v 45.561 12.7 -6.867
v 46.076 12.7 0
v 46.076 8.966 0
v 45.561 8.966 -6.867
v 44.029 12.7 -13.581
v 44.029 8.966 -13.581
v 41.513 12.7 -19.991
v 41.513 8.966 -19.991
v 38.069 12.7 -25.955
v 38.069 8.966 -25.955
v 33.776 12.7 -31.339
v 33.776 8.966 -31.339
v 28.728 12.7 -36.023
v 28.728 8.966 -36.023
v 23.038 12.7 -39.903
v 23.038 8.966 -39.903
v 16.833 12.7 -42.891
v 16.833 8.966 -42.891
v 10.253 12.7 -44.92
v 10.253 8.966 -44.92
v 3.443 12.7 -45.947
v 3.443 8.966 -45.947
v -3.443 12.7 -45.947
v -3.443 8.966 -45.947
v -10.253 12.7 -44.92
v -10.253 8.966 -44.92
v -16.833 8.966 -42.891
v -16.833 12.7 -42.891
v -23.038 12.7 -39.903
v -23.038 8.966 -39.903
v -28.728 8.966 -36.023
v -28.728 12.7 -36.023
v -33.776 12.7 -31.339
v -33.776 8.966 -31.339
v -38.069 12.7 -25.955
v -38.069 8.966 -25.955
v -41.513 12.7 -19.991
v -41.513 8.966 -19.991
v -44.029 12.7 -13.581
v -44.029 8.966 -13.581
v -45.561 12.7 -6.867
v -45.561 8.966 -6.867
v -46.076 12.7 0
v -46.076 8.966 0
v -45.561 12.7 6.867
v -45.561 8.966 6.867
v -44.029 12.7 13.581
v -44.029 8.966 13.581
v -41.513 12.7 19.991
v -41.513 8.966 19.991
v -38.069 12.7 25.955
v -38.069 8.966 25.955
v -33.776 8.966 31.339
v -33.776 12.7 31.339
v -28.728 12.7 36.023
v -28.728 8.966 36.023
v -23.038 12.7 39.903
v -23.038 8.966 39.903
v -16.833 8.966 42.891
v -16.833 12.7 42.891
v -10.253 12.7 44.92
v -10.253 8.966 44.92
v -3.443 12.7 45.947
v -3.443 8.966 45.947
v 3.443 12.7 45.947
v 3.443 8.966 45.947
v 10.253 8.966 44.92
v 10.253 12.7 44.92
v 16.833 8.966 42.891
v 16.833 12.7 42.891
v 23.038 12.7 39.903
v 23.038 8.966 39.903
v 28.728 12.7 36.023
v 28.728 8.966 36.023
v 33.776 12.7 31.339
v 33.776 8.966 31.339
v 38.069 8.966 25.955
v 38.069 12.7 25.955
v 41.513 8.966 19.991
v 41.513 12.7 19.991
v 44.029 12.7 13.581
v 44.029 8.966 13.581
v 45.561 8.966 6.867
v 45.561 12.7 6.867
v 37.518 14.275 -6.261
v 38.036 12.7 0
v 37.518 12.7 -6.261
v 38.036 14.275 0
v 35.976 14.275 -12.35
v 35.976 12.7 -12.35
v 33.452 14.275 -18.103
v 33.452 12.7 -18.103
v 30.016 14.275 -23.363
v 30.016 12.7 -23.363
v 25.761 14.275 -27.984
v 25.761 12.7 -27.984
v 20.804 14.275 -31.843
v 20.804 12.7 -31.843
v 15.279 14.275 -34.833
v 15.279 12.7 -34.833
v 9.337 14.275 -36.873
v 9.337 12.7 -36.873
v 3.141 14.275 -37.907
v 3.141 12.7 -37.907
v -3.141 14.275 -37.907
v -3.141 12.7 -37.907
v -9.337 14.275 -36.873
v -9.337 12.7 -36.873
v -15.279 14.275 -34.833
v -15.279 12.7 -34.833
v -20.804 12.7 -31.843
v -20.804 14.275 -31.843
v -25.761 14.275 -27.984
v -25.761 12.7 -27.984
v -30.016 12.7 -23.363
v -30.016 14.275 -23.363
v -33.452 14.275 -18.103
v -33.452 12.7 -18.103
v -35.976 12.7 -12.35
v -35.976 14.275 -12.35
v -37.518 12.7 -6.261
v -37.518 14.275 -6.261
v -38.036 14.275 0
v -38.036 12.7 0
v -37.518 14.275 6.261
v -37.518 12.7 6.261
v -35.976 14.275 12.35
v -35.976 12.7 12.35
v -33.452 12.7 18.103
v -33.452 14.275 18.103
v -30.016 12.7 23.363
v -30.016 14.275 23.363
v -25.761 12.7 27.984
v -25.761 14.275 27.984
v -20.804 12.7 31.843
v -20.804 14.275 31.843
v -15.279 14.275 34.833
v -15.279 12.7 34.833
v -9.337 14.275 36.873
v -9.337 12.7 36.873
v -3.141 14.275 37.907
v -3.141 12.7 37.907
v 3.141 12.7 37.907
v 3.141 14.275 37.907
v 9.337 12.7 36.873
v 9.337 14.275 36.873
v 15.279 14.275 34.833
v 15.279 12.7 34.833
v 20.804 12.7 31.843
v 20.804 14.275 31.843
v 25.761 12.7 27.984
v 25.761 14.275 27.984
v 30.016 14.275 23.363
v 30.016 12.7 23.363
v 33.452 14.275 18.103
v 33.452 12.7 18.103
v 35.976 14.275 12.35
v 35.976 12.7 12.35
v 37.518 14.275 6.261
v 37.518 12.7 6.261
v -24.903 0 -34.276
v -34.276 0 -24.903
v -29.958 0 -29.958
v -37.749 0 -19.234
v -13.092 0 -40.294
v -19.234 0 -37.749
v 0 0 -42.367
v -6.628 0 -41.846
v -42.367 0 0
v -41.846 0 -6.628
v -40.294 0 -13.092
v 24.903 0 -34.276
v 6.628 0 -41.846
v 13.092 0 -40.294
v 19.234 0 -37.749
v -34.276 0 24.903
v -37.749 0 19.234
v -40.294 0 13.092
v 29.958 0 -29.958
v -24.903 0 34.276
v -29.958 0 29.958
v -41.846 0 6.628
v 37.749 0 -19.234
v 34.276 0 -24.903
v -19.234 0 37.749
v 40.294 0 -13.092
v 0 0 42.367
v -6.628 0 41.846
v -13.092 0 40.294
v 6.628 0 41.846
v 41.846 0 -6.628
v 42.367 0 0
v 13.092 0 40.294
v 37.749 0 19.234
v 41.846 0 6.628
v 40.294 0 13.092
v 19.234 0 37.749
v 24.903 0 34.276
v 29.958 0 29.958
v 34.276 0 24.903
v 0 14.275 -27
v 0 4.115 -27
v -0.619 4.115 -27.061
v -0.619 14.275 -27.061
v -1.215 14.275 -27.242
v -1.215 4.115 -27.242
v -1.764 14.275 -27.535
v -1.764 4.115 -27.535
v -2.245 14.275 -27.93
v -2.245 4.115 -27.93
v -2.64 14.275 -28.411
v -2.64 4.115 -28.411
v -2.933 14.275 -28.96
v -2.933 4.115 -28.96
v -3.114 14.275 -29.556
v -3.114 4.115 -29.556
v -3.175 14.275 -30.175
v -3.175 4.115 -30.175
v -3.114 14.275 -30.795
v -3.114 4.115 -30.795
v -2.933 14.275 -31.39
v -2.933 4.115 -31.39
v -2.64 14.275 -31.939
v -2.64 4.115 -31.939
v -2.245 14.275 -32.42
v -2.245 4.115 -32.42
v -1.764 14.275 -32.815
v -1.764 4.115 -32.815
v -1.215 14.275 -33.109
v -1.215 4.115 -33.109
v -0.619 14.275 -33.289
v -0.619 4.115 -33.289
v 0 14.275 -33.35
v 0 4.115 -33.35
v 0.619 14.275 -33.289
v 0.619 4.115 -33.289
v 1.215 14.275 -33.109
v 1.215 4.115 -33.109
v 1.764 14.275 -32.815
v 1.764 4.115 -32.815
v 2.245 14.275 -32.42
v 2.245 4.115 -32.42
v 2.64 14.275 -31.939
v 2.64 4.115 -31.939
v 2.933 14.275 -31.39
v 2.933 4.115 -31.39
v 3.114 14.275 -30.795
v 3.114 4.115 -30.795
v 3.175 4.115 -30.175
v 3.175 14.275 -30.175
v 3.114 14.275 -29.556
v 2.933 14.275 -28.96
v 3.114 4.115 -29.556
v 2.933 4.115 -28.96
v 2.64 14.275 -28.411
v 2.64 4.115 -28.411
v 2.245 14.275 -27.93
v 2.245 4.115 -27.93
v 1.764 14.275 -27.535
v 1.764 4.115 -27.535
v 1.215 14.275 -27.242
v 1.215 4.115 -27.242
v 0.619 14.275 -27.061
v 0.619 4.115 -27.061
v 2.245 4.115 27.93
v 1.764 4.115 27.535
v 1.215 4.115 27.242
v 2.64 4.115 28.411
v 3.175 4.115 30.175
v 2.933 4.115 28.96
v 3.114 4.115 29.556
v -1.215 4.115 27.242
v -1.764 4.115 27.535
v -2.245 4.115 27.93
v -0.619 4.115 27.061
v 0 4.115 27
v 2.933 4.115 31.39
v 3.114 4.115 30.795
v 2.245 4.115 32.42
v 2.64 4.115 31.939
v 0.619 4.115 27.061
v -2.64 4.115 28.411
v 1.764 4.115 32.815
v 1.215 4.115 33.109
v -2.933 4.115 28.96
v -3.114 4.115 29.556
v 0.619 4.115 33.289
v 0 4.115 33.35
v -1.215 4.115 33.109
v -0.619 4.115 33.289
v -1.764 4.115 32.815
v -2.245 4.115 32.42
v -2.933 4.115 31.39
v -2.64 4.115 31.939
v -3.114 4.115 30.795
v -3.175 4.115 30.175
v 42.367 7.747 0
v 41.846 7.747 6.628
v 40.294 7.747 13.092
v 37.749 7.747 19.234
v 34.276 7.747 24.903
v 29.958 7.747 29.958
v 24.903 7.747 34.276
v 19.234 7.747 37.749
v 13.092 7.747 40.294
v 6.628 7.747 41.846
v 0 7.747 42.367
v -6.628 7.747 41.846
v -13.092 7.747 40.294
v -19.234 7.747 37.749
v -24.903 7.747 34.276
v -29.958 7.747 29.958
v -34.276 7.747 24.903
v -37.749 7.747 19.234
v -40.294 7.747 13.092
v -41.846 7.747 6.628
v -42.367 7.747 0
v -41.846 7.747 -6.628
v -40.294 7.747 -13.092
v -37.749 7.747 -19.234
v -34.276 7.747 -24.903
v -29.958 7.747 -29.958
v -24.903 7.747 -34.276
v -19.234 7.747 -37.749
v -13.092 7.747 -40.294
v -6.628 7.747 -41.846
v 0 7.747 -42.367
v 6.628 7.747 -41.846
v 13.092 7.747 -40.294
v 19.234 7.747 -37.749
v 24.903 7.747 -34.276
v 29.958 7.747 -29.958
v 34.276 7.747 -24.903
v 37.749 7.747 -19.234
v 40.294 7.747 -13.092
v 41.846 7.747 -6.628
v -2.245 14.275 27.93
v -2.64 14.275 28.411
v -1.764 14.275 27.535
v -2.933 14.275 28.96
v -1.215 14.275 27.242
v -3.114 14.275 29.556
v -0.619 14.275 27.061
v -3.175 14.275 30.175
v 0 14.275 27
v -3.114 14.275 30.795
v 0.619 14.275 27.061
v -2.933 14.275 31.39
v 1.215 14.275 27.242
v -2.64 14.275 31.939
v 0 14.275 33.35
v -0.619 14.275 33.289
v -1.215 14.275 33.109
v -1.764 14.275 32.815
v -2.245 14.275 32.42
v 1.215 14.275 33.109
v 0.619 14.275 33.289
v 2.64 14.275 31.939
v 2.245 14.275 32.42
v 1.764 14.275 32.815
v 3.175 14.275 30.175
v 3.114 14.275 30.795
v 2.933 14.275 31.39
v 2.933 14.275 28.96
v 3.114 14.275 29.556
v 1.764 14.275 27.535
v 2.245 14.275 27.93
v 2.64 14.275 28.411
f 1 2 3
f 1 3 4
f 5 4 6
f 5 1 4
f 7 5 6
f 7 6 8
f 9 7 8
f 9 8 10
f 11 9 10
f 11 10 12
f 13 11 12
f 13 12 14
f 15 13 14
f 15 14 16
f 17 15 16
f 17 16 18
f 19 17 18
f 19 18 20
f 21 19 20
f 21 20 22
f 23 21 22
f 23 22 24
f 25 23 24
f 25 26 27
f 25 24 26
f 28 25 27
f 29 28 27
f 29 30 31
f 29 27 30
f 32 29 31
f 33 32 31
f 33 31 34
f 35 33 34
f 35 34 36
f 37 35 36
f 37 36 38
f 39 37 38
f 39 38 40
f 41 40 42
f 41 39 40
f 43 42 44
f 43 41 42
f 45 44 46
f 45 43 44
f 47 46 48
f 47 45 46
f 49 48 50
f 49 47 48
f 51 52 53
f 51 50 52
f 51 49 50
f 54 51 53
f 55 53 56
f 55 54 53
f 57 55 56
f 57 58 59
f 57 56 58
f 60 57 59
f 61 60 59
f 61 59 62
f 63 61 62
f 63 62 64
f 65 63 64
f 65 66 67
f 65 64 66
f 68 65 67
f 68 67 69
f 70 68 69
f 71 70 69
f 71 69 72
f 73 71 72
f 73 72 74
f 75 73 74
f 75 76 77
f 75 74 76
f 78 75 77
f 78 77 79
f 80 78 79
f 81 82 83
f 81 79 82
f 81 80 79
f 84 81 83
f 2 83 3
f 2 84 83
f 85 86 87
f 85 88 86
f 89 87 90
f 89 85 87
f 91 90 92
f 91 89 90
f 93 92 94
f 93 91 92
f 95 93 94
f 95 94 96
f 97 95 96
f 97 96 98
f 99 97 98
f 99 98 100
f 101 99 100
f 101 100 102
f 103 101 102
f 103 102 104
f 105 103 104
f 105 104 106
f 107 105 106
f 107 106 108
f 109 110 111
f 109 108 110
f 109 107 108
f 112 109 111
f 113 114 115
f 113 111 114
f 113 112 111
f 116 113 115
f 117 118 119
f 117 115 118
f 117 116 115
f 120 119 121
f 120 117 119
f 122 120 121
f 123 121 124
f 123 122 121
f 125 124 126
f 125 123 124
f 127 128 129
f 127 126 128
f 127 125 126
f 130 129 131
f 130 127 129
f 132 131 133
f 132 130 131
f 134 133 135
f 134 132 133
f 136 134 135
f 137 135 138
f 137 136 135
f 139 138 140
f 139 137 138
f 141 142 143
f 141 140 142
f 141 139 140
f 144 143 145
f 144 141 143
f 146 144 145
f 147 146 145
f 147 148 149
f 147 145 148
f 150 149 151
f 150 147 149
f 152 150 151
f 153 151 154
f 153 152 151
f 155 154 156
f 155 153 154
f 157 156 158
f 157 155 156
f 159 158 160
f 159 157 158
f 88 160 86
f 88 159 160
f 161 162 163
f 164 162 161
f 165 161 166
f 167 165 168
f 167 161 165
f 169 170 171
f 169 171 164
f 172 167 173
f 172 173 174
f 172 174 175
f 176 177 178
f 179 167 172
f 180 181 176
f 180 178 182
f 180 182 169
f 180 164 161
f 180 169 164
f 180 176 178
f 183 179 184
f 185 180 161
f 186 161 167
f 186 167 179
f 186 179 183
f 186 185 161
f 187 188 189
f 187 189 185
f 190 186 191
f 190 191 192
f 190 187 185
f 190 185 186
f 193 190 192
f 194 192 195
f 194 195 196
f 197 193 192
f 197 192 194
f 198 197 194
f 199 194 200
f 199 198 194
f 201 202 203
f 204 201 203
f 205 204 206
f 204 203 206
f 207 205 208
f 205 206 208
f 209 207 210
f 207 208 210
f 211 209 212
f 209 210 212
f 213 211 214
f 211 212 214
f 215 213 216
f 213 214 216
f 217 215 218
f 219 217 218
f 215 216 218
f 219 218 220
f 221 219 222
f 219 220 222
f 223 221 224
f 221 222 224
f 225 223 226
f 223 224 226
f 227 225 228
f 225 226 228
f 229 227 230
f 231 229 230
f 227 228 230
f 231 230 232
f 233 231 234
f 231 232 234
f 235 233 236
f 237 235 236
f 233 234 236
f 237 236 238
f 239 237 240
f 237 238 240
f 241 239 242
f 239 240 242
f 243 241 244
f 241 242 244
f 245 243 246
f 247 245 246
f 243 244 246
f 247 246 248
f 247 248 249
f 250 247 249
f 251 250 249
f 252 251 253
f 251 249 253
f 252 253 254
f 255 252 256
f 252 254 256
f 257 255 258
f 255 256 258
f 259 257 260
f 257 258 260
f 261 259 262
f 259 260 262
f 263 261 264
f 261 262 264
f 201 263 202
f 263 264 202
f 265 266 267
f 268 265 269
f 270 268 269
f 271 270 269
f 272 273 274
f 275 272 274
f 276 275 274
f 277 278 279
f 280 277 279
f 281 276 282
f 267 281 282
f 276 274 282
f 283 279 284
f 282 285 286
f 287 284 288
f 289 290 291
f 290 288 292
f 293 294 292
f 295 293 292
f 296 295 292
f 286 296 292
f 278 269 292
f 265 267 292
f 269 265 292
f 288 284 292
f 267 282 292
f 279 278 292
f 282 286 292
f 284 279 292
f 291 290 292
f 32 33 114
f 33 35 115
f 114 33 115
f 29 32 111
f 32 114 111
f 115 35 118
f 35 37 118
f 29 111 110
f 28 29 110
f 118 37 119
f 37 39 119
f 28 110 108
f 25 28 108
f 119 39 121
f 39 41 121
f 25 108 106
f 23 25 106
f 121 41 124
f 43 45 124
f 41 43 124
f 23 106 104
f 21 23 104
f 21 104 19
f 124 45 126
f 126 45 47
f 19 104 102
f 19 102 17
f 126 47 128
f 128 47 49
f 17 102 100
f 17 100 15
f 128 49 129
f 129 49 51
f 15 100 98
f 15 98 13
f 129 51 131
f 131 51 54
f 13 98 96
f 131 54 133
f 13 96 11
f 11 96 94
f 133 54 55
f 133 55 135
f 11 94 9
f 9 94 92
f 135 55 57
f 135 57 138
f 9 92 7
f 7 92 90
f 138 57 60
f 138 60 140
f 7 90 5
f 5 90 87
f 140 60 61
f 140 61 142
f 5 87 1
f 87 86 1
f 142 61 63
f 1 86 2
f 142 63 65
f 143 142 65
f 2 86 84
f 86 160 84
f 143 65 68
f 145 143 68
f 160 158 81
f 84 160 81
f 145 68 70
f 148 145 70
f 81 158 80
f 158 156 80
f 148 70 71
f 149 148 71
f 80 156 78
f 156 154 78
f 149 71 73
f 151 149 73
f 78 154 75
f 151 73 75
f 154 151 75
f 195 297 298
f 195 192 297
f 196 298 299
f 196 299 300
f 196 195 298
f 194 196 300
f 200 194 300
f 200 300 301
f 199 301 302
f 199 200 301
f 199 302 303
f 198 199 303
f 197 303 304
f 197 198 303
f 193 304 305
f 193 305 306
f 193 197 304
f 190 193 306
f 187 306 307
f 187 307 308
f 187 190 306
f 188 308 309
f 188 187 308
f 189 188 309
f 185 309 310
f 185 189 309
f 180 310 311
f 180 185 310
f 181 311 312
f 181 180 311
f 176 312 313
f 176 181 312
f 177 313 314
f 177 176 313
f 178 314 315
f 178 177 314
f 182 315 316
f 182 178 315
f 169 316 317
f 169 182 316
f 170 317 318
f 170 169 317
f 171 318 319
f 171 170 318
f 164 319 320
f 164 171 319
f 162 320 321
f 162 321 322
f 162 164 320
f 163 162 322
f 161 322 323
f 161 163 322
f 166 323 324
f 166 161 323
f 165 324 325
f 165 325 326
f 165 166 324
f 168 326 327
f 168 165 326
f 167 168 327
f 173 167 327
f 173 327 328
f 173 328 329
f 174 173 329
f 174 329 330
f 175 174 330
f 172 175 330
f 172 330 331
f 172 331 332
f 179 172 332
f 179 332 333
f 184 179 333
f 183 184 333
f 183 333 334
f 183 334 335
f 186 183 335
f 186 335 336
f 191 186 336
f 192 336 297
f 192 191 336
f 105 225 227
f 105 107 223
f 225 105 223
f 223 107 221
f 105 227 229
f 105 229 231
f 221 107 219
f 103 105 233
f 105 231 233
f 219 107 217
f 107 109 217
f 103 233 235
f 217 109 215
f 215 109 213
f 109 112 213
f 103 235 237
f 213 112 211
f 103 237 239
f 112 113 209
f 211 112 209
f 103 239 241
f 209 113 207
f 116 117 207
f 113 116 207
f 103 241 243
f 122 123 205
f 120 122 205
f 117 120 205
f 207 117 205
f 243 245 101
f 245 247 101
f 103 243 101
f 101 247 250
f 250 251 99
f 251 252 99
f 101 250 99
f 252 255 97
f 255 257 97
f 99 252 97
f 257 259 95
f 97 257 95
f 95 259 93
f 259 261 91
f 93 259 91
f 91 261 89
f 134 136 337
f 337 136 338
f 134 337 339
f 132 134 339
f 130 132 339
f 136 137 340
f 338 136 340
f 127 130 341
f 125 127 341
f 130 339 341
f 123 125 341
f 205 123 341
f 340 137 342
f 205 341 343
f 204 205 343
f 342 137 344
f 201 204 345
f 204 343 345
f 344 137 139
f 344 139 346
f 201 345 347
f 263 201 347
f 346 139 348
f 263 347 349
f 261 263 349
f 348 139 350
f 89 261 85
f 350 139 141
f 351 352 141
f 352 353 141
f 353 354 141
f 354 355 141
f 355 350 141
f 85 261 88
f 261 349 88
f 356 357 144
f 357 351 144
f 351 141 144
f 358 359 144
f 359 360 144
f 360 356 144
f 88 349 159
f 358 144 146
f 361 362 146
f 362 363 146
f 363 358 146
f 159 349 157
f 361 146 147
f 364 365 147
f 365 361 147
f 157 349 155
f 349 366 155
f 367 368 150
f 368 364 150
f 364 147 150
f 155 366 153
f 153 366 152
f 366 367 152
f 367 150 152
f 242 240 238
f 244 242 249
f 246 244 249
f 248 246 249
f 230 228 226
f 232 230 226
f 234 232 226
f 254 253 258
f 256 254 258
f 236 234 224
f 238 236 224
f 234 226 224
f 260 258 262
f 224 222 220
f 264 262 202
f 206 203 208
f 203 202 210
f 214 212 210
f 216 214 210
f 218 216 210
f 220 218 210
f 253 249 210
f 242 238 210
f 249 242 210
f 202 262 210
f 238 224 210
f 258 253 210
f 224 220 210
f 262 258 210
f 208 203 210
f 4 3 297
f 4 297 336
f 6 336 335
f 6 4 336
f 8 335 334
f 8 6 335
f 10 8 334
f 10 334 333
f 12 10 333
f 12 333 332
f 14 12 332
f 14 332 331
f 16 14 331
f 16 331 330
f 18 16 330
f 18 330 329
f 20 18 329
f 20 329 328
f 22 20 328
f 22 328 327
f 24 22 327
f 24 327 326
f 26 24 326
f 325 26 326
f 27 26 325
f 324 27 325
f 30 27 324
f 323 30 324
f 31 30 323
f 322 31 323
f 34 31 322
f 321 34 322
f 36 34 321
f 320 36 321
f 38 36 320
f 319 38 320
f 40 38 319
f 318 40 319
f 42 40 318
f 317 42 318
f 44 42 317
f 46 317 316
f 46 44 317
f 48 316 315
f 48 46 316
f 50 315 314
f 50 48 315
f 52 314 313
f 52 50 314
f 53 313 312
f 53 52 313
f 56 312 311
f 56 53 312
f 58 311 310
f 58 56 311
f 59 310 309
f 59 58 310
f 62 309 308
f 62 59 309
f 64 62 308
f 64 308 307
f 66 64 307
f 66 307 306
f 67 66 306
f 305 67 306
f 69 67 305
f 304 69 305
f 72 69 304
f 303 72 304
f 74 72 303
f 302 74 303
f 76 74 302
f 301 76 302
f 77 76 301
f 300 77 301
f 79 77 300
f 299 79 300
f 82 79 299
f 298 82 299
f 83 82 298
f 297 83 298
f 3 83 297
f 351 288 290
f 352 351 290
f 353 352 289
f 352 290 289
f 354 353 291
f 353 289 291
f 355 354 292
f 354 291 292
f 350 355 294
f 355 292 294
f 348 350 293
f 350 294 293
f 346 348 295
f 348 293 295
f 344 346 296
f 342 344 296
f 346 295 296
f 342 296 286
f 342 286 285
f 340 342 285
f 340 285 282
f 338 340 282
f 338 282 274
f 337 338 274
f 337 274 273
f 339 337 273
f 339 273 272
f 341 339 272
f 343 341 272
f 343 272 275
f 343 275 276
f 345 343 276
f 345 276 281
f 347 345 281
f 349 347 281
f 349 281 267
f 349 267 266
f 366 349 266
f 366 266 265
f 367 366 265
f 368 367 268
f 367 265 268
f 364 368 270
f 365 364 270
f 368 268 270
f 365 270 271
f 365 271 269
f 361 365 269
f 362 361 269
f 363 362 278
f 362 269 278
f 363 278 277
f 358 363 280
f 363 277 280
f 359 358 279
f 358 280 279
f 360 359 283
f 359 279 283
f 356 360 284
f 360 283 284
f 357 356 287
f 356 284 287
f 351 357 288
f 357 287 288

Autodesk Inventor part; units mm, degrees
ref_plane "YZ Plane" through (0, 0, 0) normal (1, 0, 0) x (0, 1, 0)
ref_plane "XZ Plane" through (0, 0, 0) normal (0, 1, 0) x (-1, 0, 0)
ref_plane "XY Plane" through (0, 0, 0) normal (0, 0, 1) x (1, 0, 0)
sketch "Sketch1" plane through (0, 0, 0) normal (0, 0, 1) x (1, 0, 0)
  line L0 (17.5514, 0) -> (46.0756, 0)
  line L1 (46.0756, 0) -> (46.0756, 12.7)
  line L2 (46.0756, 12.7) -> (0, 12.7)
  line L3 (0, 12.7) -> (0, 0)
  line L4 (17.5514, 12.7) -> (17.5514, 0)
  line L5 (46.0756, 8.9662) -> (42.3672, 8.9662)
  line L6 (42.3672, 7.747) -> (42.3672, 0)
  line L7 (46.0756, 7.747) -> (42.3672, 7.747)
  line L8 (46.0756, 8.9662) -> (42.3672, 7.747)
  line L9 (0, 11.1252) -> (0, 12.7)
  line L10 (17.5514, 0) -> (23.85, 0)
  line L11 (0, -2.5) -> (0, 0)
  line L12 (0, 12.7) -> (38.0365, 12.7)
  line L13 (38.0365, 12.7) -> (38.0365, 14.2748)
  line L14 (38.0365, 14.2748) -> (0, 14.2748)
  line L15 (0, 14.2748) -> (0, 12.7)
  line L16 (17.5514, 12.7) -> (17.5514, 14.2748)
  line L17 (0, 0) -> (17.5514, 0)
  dimension "d1" = 12.7
  dimension "d3" = 3.7338
  dimension "d5" = 4.953
  dimension "d8" = 17.5514
  dimension "d9" = 42.3672
  dimension "d10" = 46.0756
  dimension "d11" = 1.5748
  dimension "d12" = 38.0365
revolve "Revolution1" add sketch "Sketch1" angle 360 about axis through (0, 12.7, 0) along (0, -1, 0) contours L4 L2 L1 L8 L6 L0 | L17 L3 L2 L4 | L16 L14 L13 L2 | L2 L15 L14 L16
sketch "Sketch2" plane through (0, 14.2748, 0) normal (0, 1, 0) x (1, 0, 0)
  circle A0 centre (0, 0) radius 30.1752
  point P0 (0, 30.1752)
  point P1 (0, -30.1752)
  dimension "d14" = 60.3504
hole "Hole1" at (0, 14.2748, -30.1752) at (0, 14.2748, 30.1752) direction (0, -1, 0) diameter 6.35 depth 10.16
properties part number "2016.06.09 Blank Adapter"
